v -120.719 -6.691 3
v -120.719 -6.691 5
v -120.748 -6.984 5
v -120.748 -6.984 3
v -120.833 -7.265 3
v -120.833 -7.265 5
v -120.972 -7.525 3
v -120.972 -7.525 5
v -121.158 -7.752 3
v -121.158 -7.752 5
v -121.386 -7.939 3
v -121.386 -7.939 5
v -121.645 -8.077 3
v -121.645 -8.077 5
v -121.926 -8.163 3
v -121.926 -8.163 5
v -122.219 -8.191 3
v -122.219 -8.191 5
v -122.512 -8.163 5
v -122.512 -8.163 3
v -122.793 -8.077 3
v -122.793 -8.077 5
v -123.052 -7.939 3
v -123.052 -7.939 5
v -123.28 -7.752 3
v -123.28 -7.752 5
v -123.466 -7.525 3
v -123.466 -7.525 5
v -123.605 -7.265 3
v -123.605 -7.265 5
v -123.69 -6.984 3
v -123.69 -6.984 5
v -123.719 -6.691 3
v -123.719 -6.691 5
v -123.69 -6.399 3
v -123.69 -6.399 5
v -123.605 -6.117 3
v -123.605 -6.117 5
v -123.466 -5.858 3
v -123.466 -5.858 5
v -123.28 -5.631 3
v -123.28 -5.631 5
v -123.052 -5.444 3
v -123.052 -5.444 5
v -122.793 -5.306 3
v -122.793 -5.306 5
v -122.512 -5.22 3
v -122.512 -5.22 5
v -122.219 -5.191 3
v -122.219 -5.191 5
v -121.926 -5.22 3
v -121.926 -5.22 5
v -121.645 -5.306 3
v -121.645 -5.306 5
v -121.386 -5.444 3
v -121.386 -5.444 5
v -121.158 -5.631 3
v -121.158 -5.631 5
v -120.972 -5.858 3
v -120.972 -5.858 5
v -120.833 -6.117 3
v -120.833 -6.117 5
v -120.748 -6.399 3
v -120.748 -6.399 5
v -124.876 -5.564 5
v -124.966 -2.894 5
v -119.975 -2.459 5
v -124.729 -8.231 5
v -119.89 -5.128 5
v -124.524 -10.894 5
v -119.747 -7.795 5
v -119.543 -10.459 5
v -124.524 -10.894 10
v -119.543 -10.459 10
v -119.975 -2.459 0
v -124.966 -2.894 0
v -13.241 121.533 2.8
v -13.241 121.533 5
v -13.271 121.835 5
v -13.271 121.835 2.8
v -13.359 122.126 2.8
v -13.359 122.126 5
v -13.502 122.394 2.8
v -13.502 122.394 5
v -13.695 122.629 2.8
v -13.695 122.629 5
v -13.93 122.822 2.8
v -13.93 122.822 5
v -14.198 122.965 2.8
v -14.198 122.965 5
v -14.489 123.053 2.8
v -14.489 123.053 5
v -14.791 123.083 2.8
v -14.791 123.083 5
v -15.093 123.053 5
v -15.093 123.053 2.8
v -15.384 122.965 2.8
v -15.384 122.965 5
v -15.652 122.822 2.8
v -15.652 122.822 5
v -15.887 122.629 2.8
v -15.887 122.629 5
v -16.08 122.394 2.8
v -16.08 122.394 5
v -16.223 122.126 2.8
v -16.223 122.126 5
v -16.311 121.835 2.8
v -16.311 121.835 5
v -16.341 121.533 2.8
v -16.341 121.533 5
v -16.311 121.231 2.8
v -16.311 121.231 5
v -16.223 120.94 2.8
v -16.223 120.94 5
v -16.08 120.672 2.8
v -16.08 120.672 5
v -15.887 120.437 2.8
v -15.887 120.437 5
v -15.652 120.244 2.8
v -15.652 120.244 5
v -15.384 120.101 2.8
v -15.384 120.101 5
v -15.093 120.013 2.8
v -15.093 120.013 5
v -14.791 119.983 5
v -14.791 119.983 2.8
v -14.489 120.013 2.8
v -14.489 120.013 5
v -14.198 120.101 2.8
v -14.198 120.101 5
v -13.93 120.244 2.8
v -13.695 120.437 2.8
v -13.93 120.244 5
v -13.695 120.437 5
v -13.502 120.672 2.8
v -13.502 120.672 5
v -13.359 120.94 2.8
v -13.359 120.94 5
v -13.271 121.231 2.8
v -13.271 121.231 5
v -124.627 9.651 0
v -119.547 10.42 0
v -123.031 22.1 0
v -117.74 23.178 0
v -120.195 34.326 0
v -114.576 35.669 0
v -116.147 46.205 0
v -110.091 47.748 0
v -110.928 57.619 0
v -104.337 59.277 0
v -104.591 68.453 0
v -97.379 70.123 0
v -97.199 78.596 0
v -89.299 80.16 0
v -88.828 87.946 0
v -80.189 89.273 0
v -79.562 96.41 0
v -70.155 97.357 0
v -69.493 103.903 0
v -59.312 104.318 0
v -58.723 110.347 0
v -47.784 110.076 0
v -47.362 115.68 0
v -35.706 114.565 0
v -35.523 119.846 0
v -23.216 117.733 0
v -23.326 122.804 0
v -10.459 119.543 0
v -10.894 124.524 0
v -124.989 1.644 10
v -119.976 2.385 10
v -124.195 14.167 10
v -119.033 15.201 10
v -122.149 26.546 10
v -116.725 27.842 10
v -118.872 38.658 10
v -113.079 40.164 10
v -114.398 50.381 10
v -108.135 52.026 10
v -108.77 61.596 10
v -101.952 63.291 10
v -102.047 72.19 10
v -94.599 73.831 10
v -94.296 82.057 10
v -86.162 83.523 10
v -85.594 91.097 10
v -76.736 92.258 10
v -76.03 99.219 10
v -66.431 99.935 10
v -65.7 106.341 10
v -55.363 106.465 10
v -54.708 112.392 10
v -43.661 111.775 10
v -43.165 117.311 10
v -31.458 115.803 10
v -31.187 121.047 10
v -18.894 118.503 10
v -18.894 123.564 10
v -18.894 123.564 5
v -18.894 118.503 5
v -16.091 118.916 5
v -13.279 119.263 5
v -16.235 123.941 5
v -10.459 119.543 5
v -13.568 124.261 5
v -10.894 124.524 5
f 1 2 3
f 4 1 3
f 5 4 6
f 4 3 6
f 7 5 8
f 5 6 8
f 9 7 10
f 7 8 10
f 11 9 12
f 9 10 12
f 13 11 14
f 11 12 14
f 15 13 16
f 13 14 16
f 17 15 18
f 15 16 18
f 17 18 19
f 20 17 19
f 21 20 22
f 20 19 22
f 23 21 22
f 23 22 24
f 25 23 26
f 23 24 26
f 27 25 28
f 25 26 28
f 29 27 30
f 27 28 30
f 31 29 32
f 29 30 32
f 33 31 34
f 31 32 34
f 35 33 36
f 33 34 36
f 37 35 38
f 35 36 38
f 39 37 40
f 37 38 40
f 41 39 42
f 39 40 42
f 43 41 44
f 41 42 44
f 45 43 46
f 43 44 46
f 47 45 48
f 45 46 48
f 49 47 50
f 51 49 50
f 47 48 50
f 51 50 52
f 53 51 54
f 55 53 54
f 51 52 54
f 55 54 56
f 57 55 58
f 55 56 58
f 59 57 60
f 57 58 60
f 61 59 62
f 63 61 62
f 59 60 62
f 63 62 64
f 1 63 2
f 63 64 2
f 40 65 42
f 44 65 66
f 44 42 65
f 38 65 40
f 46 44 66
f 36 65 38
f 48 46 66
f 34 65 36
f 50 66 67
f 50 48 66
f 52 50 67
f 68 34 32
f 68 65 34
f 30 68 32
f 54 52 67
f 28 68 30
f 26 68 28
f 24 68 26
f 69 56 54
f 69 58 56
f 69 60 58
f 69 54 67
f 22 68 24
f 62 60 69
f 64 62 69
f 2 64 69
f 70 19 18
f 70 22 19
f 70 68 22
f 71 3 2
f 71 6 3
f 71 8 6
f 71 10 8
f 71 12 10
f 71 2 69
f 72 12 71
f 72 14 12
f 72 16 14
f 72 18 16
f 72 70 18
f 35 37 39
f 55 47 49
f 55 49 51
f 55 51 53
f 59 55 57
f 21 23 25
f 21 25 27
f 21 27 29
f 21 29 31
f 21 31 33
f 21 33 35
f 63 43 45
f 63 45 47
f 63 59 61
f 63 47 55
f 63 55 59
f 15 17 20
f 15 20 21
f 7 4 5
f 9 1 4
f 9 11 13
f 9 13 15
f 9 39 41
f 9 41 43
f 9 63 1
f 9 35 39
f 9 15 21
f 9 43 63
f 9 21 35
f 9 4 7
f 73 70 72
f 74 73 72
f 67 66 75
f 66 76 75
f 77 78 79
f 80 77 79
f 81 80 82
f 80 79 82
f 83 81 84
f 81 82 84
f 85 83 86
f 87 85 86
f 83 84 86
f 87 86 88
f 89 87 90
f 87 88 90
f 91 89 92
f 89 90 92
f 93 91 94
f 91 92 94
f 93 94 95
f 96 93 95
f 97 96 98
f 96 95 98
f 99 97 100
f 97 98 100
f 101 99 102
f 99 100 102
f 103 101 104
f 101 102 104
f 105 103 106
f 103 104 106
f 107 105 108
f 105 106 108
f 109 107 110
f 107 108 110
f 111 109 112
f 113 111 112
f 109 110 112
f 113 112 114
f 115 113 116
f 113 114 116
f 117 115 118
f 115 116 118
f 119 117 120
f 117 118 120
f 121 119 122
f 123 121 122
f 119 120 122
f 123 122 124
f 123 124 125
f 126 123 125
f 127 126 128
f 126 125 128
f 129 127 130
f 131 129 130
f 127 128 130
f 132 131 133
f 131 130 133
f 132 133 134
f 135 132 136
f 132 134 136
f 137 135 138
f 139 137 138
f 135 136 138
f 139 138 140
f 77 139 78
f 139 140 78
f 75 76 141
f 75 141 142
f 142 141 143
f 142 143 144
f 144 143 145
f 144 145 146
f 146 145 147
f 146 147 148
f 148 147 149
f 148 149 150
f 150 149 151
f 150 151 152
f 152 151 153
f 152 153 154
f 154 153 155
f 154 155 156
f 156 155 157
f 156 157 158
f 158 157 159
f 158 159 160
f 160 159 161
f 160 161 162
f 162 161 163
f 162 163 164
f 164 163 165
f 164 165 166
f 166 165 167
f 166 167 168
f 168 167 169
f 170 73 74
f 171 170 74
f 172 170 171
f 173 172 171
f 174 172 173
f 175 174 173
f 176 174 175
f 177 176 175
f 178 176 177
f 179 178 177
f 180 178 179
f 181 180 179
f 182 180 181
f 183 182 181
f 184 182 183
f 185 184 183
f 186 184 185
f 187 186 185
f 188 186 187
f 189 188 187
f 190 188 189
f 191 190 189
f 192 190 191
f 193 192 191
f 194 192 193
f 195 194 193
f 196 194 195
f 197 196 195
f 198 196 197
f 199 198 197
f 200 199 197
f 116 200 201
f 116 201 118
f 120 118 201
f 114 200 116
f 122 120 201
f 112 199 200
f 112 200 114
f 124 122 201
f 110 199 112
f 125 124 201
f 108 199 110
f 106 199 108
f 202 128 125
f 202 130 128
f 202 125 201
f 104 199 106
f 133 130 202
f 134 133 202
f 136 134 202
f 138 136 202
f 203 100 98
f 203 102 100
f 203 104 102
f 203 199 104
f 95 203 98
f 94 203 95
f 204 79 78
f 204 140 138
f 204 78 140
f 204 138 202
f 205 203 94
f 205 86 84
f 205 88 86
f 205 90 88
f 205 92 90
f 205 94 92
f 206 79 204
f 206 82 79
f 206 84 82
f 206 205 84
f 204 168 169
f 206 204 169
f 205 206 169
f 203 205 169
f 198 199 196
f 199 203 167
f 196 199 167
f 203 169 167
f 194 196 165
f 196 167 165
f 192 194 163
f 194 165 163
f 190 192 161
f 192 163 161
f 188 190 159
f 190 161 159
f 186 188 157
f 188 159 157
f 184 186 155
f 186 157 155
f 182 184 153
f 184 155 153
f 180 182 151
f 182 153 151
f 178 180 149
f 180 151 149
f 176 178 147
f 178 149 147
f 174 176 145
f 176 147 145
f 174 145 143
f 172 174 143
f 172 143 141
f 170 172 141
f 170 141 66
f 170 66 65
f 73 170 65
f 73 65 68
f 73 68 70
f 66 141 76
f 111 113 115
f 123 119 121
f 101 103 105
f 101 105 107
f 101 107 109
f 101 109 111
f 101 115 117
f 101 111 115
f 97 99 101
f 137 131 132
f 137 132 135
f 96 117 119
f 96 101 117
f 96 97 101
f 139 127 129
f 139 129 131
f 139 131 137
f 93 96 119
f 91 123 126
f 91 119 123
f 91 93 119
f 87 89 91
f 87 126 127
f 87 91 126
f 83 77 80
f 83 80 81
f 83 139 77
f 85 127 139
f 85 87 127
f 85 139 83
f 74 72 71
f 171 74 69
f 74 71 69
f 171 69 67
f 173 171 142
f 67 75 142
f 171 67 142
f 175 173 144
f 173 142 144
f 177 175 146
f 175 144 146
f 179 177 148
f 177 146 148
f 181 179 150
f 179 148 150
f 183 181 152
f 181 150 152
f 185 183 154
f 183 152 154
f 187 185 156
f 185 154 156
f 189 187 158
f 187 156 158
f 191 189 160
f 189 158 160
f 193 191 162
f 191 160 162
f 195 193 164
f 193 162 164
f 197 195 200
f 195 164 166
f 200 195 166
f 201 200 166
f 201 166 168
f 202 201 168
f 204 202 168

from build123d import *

# Parameters (mm, degrees)
F1_DEPTH = 10
F3_DEPTH = 5
F5_DEPTH = 5
F6_R     = 1.5
F7_DEPTH = 2
F8_R     = 1.55
F9_DEPTH = 2.2


with BuildPart() as f1:
    # F0 (on Top) → F1 (new body)
    with BuildSketch(Plane.XY):
        with BuildLine():
            ThreePointArc((-119.543364, -10.458689), (-91.925333, 77.134513), (-10.458689, 119.543364))
            Line((-10.458689, 119.543364), (-10.894468, 124.524337))
            ThreePointArc((-10.894468, 124.524337), (-95.755555, 80.348451), (-124.524337, -10.894468))
            Line((-124.524337, -10.894468), (-119.543364, -10.458689))
        make_face()
    extrude(amount=F1_DEPTH)

    # F2 (on face) → F3 (cut)
    with BuildSketch(Plane(origin=(0, 0, 0), x_dir=(1, 0, 0), z_dir=(0, 0, -1))):
        with BuildLine():
            ThreePointArc((-119.974809, 2.458689), (-119.825869, 6.462291), (-119.543364, 10.458689))
            Line((-119.543364, 10.458689), (-124.524337, 10.894468))
            ThreePointArc((-124.524337, 10.894468), (-124.809525, 6.898011), (-124.966484, 2.894468))
            Line((-124.966484, 2.894468), (-119.974809, 2.458689))
        make_face()
    extrude(amount=-F3_DEPTH, mode=Mode.SUBTRACT)

    # F4 (on face) → F5 (cut)
    with BuildSketch(Plane.XY.offset(10)):
        with BuildLine():
            ThreePointArc((-18.894468, 118.503161), (-14.685791, 119.097975), (-10.458689, 119.543364))
            Line((-10.458689, 119.543364), (-10.894468, 124.524337))
            ThreePointArc((-10.894468, 124.524337), (-14.90221, 124.108518), (-18.894468, 123.563745))
            Line((-18.894468, 123.563745), (-18.894468, 118.503161))
        make_face()
    extrude(amount=-F5_DEPTH, mode=Mode.SUBTRACT)

    # F6 (on face) → F7 (join)
    with BuildSketch(Plane(origin=(0, 0, 5), x_dir=(1, 0, 0), z_dir=(0, 0, -1))):
        with Locations((-122.219087, 6.691388)):
            Circle(F6_R)
    extrude(amount=F7_DEPTH)

    # F8 (on face) → F9 (cut)
    with BuildSketch(Plane.XY.offset(5)):
        with Locations((-14.790966, 121.532989)):
            Circle(F8_R)
    extrude(amount=-F9_DEPTH, mode=Mode.SUBTRACT)


solid = f1.part
